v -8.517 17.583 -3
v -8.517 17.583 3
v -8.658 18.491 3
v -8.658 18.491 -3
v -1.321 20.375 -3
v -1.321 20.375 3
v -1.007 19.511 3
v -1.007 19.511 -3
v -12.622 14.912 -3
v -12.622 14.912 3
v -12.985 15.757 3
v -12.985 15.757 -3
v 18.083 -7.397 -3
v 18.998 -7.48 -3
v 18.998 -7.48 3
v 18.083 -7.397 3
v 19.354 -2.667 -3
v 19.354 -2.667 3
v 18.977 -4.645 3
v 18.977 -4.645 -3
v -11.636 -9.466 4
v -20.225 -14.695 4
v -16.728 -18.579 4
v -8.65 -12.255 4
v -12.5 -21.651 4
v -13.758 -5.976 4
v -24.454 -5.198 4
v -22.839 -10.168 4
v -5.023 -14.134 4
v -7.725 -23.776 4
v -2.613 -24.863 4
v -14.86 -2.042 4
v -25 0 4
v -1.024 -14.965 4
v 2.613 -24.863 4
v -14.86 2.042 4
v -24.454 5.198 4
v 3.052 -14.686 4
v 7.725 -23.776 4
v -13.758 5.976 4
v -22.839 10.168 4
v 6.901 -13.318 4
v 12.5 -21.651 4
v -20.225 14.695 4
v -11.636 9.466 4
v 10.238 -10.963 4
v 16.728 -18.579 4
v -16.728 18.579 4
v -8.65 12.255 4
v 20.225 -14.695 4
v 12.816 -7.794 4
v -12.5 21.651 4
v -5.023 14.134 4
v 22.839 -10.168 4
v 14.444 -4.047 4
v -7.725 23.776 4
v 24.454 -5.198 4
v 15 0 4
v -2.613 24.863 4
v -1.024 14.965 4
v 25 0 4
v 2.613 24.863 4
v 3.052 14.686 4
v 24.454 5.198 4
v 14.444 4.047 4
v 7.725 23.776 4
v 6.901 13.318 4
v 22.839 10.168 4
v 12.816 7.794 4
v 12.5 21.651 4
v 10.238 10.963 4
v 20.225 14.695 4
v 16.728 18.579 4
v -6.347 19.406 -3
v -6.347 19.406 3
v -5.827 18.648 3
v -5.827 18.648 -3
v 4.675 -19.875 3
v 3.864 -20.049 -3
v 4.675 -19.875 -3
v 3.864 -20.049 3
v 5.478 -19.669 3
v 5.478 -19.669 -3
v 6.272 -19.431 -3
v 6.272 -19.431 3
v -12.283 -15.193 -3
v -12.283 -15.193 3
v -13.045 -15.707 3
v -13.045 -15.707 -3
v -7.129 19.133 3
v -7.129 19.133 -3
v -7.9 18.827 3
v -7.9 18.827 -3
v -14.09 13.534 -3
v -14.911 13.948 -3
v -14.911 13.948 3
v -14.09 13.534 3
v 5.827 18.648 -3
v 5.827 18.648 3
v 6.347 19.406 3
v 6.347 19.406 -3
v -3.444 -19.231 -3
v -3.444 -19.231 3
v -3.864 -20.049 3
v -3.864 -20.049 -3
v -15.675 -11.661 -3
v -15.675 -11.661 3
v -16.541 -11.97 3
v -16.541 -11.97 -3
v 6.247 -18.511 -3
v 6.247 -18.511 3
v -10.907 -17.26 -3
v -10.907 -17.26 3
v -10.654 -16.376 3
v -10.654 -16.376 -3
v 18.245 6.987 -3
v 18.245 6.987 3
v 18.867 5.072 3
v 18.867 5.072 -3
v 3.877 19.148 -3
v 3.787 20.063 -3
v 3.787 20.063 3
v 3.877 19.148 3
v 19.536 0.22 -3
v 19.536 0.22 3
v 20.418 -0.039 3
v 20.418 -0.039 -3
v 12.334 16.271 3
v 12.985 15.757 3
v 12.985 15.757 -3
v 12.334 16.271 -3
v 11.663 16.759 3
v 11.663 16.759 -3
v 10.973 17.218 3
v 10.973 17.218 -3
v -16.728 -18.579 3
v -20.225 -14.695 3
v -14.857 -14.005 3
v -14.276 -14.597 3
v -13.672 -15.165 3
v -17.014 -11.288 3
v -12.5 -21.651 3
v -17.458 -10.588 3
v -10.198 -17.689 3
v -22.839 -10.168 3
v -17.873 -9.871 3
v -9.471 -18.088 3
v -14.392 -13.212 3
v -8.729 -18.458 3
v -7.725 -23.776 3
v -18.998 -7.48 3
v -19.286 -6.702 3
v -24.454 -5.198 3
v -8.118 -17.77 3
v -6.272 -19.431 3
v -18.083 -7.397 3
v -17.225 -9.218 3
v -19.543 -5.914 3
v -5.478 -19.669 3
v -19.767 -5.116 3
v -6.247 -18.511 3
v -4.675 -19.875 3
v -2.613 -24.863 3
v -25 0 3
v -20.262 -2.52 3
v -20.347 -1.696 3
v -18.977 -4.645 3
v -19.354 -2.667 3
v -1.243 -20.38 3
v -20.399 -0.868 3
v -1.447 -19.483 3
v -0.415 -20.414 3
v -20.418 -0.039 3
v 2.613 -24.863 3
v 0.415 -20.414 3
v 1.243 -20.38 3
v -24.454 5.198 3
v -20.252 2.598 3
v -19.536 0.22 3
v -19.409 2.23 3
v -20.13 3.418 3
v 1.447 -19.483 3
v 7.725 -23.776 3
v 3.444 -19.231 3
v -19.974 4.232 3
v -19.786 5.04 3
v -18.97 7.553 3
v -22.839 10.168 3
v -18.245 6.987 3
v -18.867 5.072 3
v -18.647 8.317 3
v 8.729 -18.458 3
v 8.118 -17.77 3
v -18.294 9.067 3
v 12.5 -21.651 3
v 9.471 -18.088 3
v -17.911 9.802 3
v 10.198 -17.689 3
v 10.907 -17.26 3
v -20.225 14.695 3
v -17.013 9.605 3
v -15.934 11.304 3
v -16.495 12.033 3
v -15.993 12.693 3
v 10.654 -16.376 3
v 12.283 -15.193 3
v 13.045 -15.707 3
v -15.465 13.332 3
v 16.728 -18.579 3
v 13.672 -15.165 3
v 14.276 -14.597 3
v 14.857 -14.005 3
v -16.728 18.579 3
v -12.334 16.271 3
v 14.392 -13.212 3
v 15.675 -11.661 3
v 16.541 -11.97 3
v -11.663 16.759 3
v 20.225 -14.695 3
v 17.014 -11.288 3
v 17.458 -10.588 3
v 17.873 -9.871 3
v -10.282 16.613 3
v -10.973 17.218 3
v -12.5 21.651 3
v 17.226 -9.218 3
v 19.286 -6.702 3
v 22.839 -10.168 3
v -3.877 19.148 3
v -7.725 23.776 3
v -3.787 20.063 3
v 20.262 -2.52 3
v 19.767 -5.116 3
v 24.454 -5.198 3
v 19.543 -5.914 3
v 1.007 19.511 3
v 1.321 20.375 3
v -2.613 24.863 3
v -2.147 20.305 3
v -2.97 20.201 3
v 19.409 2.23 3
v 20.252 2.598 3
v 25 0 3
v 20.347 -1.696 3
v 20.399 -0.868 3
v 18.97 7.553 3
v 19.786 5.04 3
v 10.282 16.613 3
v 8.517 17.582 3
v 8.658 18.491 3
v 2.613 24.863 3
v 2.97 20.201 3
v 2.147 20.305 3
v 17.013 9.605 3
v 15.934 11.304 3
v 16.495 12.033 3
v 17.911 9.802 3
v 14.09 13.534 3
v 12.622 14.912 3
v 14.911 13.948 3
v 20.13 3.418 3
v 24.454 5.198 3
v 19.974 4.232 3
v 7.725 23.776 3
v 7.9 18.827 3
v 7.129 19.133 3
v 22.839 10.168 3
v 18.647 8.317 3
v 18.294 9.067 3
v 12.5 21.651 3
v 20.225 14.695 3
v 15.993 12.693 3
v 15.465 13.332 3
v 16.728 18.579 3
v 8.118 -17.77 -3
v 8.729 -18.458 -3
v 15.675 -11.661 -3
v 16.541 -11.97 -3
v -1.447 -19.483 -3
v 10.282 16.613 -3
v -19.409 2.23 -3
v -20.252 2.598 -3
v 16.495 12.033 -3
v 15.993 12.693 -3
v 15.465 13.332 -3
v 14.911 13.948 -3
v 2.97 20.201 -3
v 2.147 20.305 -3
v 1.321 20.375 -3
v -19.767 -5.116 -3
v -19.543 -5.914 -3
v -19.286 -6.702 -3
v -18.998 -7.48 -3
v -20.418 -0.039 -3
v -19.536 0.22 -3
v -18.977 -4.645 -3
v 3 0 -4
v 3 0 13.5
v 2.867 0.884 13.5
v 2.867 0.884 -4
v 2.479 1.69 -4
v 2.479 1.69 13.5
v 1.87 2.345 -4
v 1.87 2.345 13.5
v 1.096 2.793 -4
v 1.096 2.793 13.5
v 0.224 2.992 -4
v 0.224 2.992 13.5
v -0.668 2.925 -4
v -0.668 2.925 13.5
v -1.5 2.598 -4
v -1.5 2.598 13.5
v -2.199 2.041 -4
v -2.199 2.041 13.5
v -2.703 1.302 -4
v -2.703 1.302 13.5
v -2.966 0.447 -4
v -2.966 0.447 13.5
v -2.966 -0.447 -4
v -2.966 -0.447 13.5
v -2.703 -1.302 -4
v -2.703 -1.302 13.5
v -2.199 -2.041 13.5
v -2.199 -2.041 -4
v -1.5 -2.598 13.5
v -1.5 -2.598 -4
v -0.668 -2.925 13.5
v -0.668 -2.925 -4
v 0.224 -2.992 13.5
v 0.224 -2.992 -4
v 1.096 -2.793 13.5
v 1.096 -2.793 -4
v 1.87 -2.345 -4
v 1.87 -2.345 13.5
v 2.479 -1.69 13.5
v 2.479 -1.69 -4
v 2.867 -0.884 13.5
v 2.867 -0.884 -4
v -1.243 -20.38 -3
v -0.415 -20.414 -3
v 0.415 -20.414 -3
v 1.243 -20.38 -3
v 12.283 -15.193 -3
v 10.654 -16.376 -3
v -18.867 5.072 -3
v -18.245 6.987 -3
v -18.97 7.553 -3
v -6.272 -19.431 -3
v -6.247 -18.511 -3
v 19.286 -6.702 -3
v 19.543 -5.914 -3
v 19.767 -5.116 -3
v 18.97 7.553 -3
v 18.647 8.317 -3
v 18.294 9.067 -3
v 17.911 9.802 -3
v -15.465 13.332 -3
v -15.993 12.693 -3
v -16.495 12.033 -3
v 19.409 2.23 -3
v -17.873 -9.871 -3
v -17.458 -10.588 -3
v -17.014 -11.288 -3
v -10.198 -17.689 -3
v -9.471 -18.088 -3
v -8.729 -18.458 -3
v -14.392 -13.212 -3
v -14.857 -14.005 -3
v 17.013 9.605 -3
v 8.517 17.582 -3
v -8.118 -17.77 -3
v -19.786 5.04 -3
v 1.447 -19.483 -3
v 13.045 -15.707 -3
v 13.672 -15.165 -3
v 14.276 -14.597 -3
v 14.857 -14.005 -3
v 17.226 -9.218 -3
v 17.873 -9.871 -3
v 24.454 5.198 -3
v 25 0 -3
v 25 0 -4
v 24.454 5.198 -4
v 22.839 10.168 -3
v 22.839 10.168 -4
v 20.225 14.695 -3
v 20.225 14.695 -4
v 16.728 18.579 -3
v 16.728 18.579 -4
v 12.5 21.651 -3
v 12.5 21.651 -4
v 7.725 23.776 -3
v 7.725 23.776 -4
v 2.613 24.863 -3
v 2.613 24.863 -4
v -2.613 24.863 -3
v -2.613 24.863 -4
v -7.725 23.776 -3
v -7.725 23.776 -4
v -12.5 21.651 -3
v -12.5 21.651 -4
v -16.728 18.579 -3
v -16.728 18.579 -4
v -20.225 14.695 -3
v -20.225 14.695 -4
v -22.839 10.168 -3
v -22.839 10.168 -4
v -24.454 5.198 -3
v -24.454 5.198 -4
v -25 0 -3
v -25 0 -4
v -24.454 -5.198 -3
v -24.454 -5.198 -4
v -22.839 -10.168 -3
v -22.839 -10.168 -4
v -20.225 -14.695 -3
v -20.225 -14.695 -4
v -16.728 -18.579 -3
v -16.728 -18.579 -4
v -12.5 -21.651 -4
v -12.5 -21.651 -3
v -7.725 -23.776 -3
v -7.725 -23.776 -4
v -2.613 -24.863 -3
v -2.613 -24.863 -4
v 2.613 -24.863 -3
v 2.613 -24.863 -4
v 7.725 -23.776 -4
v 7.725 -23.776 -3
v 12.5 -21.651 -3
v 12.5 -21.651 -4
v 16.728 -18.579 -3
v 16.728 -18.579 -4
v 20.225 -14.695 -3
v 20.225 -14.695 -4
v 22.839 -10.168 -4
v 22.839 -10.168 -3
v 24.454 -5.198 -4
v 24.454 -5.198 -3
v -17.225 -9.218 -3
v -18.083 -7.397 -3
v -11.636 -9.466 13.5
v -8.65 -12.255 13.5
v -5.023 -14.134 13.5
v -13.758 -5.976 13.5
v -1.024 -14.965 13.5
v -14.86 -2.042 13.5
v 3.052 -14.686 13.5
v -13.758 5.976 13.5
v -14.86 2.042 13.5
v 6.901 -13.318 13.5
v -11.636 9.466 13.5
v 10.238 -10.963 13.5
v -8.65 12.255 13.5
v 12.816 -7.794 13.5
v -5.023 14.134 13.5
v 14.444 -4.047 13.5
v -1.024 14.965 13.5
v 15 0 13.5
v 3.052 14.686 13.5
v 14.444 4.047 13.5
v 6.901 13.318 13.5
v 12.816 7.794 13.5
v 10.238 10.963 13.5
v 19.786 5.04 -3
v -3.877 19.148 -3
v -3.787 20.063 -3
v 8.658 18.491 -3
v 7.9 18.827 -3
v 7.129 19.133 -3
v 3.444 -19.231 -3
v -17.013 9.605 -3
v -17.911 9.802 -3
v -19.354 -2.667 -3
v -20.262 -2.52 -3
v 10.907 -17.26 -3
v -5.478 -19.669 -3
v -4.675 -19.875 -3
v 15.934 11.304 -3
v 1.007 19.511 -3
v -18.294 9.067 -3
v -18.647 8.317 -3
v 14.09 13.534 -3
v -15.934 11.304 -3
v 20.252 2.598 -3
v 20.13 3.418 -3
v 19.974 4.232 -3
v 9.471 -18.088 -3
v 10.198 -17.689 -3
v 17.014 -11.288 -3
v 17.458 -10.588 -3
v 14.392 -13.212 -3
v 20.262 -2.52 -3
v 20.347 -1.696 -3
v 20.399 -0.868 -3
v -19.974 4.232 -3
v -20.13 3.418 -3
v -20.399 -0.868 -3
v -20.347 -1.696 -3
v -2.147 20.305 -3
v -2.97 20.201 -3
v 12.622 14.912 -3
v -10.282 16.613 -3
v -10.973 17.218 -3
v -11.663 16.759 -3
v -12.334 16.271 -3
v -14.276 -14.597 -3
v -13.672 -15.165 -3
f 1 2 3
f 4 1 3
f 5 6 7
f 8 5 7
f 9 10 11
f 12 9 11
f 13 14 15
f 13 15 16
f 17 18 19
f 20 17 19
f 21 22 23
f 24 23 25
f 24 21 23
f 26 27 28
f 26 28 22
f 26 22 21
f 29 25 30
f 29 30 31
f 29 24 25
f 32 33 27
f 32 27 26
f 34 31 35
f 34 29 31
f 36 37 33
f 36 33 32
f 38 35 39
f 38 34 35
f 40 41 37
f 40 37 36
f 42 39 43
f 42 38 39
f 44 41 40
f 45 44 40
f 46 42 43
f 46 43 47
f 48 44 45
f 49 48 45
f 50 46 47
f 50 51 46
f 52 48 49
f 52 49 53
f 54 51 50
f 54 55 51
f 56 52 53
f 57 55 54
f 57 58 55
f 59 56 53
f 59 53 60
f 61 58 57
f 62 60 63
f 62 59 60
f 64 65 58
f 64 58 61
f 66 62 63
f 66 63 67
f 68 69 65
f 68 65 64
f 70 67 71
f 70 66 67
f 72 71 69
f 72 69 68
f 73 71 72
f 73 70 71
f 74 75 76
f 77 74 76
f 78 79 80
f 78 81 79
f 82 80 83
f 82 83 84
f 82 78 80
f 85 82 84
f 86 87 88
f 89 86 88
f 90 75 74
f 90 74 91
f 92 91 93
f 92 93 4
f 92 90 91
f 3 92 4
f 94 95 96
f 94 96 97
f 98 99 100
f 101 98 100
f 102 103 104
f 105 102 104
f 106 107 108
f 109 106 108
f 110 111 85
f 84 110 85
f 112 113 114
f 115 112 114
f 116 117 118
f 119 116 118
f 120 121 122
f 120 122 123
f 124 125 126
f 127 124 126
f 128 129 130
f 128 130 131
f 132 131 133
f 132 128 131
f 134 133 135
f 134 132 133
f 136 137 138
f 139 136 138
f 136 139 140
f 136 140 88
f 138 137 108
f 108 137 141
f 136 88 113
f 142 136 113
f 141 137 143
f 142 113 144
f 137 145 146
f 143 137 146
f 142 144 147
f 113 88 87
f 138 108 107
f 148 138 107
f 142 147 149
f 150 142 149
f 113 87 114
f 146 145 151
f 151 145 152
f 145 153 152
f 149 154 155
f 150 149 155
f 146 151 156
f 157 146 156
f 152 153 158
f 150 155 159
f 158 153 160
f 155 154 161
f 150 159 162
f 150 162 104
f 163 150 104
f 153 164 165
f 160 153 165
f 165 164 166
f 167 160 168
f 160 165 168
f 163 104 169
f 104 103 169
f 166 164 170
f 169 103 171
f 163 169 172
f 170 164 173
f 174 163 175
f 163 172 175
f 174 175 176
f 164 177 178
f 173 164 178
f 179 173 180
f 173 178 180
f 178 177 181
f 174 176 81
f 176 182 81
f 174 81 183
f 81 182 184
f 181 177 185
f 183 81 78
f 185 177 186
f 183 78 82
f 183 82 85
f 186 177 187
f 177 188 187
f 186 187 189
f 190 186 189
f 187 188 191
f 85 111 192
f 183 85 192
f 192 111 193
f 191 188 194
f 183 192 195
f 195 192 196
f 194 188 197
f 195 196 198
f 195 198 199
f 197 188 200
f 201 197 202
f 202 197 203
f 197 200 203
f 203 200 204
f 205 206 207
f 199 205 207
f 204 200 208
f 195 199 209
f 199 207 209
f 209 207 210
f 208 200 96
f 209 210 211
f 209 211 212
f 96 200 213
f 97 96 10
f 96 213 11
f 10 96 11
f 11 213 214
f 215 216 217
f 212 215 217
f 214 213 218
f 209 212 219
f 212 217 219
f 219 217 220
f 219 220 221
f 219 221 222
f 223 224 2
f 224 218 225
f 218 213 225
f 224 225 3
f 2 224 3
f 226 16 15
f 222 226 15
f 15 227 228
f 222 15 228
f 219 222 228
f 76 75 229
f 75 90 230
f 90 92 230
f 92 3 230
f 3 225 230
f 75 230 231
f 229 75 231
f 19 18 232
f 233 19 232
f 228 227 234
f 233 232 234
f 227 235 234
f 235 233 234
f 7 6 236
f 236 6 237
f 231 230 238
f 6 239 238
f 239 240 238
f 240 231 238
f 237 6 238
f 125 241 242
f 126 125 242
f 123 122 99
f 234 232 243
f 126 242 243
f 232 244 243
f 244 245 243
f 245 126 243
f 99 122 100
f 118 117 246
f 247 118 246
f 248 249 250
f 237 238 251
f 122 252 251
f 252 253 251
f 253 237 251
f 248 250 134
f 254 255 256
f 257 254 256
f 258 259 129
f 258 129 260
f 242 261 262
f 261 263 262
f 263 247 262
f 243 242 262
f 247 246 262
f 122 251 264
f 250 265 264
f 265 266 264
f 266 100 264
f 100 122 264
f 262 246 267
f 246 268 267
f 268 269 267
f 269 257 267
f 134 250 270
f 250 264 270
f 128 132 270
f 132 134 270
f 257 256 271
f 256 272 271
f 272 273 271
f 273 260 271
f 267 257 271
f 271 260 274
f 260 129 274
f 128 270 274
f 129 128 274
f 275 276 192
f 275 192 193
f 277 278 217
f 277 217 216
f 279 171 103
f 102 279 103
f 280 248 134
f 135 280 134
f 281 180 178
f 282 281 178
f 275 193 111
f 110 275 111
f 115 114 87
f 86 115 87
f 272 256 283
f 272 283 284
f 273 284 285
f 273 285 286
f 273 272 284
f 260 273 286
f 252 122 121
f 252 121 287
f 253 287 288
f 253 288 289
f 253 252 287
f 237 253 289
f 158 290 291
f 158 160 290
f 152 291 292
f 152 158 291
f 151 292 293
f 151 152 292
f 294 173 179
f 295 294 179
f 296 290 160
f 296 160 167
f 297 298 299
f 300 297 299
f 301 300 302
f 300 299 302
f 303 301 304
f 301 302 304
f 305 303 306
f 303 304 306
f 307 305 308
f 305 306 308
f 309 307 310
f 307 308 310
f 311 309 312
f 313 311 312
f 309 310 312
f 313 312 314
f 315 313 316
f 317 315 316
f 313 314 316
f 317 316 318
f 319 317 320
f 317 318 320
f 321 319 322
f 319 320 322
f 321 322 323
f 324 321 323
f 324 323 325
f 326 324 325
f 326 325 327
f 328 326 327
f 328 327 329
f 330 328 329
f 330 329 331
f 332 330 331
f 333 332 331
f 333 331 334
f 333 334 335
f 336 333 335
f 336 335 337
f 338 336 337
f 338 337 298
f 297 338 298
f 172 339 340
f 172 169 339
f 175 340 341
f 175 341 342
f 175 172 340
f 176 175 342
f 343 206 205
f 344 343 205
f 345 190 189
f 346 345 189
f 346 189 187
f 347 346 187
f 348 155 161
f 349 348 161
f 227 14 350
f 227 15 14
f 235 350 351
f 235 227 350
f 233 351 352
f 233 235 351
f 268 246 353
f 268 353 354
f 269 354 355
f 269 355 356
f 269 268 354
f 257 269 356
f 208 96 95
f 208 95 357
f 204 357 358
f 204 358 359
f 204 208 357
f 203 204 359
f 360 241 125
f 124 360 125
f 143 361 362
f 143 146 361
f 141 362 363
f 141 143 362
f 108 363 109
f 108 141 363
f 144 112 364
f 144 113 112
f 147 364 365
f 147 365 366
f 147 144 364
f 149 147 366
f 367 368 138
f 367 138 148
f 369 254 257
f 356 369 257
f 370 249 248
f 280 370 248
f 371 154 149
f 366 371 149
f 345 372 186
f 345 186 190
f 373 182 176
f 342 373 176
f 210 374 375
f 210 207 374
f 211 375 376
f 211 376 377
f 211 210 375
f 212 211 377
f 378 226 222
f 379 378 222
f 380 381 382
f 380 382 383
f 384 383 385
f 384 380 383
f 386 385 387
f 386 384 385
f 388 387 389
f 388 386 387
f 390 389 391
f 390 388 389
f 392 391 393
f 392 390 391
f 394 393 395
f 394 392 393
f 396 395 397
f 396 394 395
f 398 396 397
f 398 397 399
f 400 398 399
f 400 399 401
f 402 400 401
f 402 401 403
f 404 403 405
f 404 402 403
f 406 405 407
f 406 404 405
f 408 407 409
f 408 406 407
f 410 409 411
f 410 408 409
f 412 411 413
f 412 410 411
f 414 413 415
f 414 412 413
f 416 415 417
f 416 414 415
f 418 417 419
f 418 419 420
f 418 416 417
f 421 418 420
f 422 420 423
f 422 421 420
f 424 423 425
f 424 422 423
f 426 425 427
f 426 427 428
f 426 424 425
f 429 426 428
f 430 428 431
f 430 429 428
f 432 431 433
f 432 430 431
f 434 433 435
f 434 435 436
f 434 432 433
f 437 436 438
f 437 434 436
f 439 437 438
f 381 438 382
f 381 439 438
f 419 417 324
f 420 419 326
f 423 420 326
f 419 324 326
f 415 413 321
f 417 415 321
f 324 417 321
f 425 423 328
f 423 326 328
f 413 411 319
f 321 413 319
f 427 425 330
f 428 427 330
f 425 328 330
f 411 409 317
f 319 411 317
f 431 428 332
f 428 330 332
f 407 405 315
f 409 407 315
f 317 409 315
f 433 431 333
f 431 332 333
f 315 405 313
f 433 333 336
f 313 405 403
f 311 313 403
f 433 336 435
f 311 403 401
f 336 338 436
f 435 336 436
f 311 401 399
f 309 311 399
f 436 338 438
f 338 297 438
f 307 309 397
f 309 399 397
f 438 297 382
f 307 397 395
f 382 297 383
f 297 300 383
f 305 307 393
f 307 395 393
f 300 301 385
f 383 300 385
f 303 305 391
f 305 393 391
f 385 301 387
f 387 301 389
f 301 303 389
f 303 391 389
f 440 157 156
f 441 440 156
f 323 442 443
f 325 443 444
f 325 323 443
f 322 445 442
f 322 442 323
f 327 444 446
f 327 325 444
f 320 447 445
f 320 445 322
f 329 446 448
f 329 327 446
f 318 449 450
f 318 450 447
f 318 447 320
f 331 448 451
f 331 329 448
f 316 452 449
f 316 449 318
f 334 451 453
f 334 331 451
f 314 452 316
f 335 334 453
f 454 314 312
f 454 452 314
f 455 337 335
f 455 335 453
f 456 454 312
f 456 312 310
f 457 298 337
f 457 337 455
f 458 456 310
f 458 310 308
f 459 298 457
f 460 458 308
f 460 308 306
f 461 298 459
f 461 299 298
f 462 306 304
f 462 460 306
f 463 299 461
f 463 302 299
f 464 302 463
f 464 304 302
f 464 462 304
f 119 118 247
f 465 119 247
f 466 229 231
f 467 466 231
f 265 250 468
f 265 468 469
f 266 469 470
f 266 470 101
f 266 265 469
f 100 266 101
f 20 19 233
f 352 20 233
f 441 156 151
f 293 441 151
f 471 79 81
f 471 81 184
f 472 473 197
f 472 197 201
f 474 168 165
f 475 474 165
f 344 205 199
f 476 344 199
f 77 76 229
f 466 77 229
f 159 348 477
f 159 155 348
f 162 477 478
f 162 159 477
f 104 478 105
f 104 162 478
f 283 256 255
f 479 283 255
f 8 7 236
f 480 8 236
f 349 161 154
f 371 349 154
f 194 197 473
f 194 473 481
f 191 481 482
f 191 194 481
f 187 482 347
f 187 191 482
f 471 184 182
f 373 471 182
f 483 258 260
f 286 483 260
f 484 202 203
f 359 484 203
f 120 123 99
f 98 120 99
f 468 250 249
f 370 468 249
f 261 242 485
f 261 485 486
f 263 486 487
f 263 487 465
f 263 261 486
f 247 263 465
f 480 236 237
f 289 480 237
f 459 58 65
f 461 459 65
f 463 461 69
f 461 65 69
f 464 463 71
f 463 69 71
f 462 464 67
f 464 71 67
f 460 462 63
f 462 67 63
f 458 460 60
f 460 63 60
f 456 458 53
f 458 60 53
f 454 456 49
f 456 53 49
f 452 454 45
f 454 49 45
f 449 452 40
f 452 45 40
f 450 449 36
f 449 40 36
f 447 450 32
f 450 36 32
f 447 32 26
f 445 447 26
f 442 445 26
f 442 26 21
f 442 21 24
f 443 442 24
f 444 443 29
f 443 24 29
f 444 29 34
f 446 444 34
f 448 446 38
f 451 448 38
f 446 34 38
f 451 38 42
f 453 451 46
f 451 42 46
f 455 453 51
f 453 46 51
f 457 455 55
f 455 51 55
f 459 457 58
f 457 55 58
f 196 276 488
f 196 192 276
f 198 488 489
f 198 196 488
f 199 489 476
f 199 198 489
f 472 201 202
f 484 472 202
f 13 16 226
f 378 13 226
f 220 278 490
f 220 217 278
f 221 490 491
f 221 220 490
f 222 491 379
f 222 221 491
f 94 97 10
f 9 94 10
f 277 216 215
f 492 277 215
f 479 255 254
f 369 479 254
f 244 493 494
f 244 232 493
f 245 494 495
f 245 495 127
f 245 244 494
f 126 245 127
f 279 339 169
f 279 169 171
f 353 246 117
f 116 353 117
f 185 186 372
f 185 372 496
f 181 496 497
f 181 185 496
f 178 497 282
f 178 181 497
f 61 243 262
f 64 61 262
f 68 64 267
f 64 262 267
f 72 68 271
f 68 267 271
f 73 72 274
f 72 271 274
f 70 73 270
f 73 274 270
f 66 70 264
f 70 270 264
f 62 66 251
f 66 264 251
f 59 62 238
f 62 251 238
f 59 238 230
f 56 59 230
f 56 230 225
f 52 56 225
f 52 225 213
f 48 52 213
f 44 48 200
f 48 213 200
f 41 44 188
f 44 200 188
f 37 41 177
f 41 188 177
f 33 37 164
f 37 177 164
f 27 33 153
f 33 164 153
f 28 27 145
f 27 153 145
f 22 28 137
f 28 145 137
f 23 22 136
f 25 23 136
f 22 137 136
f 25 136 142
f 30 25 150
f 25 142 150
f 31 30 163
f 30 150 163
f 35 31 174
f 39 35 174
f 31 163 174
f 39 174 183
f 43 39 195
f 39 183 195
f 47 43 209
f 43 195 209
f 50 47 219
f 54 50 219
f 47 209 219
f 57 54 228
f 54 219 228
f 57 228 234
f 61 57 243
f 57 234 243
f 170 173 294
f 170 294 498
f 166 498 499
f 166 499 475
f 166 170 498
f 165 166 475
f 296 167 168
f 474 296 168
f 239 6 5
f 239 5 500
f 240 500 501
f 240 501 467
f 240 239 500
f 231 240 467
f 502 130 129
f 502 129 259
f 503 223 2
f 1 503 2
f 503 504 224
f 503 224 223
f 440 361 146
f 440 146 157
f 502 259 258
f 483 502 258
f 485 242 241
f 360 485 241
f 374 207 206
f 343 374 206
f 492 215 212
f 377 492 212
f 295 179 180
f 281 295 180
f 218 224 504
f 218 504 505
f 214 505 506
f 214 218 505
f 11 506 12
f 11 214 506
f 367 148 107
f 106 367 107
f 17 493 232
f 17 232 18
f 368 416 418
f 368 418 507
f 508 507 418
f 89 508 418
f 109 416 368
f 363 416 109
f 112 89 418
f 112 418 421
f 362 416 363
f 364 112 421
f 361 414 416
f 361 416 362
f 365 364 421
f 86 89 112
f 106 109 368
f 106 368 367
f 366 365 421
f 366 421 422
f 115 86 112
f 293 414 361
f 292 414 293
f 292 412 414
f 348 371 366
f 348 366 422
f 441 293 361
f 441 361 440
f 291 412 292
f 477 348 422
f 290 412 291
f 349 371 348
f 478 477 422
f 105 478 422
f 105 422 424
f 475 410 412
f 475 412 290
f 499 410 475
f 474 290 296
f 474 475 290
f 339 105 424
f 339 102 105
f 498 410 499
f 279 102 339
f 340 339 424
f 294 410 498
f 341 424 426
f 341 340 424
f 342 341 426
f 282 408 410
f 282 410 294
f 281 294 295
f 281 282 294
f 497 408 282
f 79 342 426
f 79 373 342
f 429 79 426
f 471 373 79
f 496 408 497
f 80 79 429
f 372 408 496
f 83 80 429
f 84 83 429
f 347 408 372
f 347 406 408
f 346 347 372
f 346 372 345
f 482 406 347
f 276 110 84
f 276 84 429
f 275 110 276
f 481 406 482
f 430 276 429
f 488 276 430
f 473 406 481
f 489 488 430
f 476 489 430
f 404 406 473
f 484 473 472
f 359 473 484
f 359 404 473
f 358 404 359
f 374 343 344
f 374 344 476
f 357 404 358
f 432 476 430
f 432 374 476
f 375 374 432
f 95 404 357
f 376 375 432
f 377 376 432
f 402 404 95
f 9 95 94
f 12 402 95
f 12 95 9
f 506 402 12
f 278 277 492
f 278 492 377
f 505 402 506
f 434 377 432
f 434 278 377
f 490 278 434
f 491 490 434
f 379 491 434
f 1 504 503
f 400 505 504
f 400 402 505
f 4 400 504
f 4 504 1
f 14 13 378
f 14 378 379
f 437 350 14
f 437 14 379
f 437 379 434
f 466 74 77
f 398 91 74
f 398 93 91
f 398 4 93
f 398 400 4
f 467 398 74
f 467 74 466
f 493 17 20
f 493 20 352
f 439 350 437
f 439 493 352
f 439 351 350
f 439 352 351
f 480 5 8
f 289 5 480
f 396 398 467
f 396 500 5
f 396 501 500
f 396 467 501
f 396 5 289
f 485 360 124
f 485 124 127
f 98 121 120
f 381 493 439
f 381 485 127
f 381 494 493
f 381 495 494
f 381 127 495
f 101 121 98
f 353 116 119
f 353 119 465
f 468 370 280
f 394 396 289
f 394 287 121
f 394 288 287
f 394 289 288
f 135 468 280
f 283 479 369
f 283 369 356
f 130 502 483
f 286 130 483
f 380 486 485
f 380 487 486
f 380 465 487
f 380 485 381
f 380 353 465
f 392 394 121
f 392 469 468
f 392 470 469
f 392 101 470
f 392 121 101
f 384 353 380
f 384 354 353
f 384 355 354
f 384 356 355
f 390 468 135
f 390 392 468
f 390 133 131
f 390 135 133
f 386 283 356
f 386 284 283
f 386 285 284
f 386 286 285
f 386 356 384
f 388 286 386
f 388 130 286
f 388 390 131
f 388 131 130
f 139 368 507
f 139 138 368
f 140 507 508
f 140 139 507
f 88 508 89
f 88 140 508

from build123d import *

# Parameters (mm, degrees)
SKETCH2_R           = 20.417784581
BOSS_EXTRUDE1_DEPTH = 3
CUT_EXTRUDE3_DEPTH  = 6
SKETCH5_R           = 25
BOSS_EXTRUDE2_DEPTH = 1
SKETCH6_R           = 15
BOSS_EXTRUDE3_DEPTH = 9.5
SKETCH8_R           = 3
CUT_EXTRUDE4_DEPTH  = 40.449334595


with BuildPart() as part:
    # Sketch2 → Boss-Extrude1 (new, symmetric)
    with BuildSketch(Plane.XY):
        Circle(SKETCH2_R)
    extrude(amount=BOSS_EXTRUDE1_DEPTH, both=True)

    # Sketch4 → Cut-Extrude3 (cut)
    with BuildSketch(Plane.XY.offset(3)):
        Polygon((1.006646689, 19.511049769), (1.376859102, 20.528200014), (-1.376813629, 20.528075077), (-1.006601216, 19.510924833), align=None)
        Polygon((5.827221798, 18.647731411), (6.438758286, 19.540857927), (3.771566178, 20.225547476), (3.877192707, 19.148284794), align=None)
        Polygon((10.28165113, 16.612707507), (11.096086608, 17.32569187), (8.682964611, 18.652174343), (8.517368354, 17.582487599), align=None)
        Polygon((14.090046509, 13.533846092), (15.056206999, 14.021888874), (13.048780443, 15.906816498), (12.622366422, 14.911918045), align=None)
        Polygon((17.013112445, 9.604603354), (18.070290531, 9.837039031), (16.59469341, 12.161974871), (15.934254785, 11.304377837), align=None)
        Polygon((18.867181957, 5.071868063), (19.948951252, 5.034091847), (19.09790076, 7.652951634), (18.244935319, 6.986541995), align=None)
        Polygon((19.535757038, 0.22044865), (20.574145998, -0.085165841), (20.401116767, 2.663065301), (19.409219466, 2.229716025), align=None)
        Polygon((18.976828657, -4.644822364), (19.906591485, -5.199072246), (20.422455578, -2.49415122), (19.353950973, -2.667211203), align=None)
        Polygon((17.225516339, -9.218242105), (17.988232618, -9.986301822), (19.160576396, -7.494651046), (18.08260256, -7.396547742), align=None)
        Polygon((14.391861479, -13.212445793), (14.939606939, -14.146055326), (16.694767732, -12.024234384), (15.675057726, -11.661131984), align=None)
        Polygon((10.653913032, -16.37646292), (10.952270812, -17.416960149), (13.179965412, -15.798290853), (12.282591366, -15.193004416), align=None)
        Polygon((6.246540048, -18.511486653), (6.27676323, -19.593493311), (8.837017393, -18.579682606), (8.118364618, -17.770244505), align=None)
        Polygon((1.446673978, -19.483365599), (1.20686353, -20.538895228), (3.93880707, -20.19364457), (3.444031164, -19.230914778), align=None)
        Polygon((-3.444091937, -19.23103303), (-3.938867844, -20.193762822), (-1.206892986, -20.538765578), (-1.446703434, -19.483235948), align=None)
        Polygon((-8.11845289, -17.770343928), (-8.837105665, -18.579782029), (-6.276759518, -19.593360409), (-6.246536335, -18.51135375), align=None)
        Polygon((-12.28270159, -15.193078763), (-13.180075636, -15.7983652), (-10.952234165, -17.416832345), (-10.653876385, -16.376335116), align=None)
        Polygon((-15.675182977, -11.661176583), (-16.694892983, -12.024278984), (-14.939539659, -14.145940651), (-14.391794199, -13.212331118), align=None)
        Polygon((-18.082734968, -7.396559792), (-19.160708804, -7.494663096), (-17.988138933, -9.986207481), (-17.225422655, -9.218147765), align=None)
        Polygon((-19.354082217, -2.667189946), (-20.422586822, -2.494129963), (-19.906477283, -5.199004168), (-18.976714454, -4.644754285), align=None)
        Polygon((-19.409341301, 2.229769254), (-20.401238602, 2.663118529), (-20.574018453, -0.085128303), (-19.535629493, 0.220486188), align=None)
        Polygon((-18.245040089, 6.98662385), (-19.098005529, 7.653033489), (-19.948818379, 5.034096487), (-18.867049084, 5.071872703), align=None)
        Polygon((-15.934335907, 11.304483176), (-16.594774532, 12.162080209), (-18.070160678, 9.837010481), (-17.012982592, 9.604574804), align=None)
        Polygon((-12.622418798, 14.912040248), (-13.04883282, 15.906938701), (-15.056088326, 14.021828928), (-14.089927835, 13.533786146), align=None)
        Polygon((-8.517388694, 17.582618989), (-8.682984951, 18.652305732), (-11.095986571, 17.325604294), (-10.281551093, 16.612619931), align=None)
        Polygon((-3.877179733, 19.148417114), (-3.771553204, 20.225679796), (-6.438683171, 19.540748224), (-5.827146683, 18.647621709), align=None)
    extrude(amount=-CUT_EXTRUDE3_DEPTH, mode=Mode.SUBTRACT)

    # Sketch5 → Boss-Extrude2 (add)
    with BuildSketch(Plane.XY.offset(3)):
        Circle(SKETCH5_R)
    boss_extrude2 = extrude(amount=BOSS_EXTRUDE2_DEPTH)

    # Mirror2: Boss-Extrude2 across plane
    add(boss_extrude2.mirror(Plane.XY))

    # Sketch6 → Boss-Extrude3 (add)
    with BuildSketch(Plane.XY.offset(4)):
        Circle(SKETCH6_R)
    extrude(amount=BOSS_EXTRUDE3_DEPTH)

    # Sketch8 → Cut-Extrude4 (cut, through all)
    with BuildSketch(Plane.XY.offset(13.5)):
        Circle(SKETCH8_R)
    extrude(amount=-CUT_EXTRUDE4_DEPTH, mode=Mode.SUBTRACT)


solid = part.part
